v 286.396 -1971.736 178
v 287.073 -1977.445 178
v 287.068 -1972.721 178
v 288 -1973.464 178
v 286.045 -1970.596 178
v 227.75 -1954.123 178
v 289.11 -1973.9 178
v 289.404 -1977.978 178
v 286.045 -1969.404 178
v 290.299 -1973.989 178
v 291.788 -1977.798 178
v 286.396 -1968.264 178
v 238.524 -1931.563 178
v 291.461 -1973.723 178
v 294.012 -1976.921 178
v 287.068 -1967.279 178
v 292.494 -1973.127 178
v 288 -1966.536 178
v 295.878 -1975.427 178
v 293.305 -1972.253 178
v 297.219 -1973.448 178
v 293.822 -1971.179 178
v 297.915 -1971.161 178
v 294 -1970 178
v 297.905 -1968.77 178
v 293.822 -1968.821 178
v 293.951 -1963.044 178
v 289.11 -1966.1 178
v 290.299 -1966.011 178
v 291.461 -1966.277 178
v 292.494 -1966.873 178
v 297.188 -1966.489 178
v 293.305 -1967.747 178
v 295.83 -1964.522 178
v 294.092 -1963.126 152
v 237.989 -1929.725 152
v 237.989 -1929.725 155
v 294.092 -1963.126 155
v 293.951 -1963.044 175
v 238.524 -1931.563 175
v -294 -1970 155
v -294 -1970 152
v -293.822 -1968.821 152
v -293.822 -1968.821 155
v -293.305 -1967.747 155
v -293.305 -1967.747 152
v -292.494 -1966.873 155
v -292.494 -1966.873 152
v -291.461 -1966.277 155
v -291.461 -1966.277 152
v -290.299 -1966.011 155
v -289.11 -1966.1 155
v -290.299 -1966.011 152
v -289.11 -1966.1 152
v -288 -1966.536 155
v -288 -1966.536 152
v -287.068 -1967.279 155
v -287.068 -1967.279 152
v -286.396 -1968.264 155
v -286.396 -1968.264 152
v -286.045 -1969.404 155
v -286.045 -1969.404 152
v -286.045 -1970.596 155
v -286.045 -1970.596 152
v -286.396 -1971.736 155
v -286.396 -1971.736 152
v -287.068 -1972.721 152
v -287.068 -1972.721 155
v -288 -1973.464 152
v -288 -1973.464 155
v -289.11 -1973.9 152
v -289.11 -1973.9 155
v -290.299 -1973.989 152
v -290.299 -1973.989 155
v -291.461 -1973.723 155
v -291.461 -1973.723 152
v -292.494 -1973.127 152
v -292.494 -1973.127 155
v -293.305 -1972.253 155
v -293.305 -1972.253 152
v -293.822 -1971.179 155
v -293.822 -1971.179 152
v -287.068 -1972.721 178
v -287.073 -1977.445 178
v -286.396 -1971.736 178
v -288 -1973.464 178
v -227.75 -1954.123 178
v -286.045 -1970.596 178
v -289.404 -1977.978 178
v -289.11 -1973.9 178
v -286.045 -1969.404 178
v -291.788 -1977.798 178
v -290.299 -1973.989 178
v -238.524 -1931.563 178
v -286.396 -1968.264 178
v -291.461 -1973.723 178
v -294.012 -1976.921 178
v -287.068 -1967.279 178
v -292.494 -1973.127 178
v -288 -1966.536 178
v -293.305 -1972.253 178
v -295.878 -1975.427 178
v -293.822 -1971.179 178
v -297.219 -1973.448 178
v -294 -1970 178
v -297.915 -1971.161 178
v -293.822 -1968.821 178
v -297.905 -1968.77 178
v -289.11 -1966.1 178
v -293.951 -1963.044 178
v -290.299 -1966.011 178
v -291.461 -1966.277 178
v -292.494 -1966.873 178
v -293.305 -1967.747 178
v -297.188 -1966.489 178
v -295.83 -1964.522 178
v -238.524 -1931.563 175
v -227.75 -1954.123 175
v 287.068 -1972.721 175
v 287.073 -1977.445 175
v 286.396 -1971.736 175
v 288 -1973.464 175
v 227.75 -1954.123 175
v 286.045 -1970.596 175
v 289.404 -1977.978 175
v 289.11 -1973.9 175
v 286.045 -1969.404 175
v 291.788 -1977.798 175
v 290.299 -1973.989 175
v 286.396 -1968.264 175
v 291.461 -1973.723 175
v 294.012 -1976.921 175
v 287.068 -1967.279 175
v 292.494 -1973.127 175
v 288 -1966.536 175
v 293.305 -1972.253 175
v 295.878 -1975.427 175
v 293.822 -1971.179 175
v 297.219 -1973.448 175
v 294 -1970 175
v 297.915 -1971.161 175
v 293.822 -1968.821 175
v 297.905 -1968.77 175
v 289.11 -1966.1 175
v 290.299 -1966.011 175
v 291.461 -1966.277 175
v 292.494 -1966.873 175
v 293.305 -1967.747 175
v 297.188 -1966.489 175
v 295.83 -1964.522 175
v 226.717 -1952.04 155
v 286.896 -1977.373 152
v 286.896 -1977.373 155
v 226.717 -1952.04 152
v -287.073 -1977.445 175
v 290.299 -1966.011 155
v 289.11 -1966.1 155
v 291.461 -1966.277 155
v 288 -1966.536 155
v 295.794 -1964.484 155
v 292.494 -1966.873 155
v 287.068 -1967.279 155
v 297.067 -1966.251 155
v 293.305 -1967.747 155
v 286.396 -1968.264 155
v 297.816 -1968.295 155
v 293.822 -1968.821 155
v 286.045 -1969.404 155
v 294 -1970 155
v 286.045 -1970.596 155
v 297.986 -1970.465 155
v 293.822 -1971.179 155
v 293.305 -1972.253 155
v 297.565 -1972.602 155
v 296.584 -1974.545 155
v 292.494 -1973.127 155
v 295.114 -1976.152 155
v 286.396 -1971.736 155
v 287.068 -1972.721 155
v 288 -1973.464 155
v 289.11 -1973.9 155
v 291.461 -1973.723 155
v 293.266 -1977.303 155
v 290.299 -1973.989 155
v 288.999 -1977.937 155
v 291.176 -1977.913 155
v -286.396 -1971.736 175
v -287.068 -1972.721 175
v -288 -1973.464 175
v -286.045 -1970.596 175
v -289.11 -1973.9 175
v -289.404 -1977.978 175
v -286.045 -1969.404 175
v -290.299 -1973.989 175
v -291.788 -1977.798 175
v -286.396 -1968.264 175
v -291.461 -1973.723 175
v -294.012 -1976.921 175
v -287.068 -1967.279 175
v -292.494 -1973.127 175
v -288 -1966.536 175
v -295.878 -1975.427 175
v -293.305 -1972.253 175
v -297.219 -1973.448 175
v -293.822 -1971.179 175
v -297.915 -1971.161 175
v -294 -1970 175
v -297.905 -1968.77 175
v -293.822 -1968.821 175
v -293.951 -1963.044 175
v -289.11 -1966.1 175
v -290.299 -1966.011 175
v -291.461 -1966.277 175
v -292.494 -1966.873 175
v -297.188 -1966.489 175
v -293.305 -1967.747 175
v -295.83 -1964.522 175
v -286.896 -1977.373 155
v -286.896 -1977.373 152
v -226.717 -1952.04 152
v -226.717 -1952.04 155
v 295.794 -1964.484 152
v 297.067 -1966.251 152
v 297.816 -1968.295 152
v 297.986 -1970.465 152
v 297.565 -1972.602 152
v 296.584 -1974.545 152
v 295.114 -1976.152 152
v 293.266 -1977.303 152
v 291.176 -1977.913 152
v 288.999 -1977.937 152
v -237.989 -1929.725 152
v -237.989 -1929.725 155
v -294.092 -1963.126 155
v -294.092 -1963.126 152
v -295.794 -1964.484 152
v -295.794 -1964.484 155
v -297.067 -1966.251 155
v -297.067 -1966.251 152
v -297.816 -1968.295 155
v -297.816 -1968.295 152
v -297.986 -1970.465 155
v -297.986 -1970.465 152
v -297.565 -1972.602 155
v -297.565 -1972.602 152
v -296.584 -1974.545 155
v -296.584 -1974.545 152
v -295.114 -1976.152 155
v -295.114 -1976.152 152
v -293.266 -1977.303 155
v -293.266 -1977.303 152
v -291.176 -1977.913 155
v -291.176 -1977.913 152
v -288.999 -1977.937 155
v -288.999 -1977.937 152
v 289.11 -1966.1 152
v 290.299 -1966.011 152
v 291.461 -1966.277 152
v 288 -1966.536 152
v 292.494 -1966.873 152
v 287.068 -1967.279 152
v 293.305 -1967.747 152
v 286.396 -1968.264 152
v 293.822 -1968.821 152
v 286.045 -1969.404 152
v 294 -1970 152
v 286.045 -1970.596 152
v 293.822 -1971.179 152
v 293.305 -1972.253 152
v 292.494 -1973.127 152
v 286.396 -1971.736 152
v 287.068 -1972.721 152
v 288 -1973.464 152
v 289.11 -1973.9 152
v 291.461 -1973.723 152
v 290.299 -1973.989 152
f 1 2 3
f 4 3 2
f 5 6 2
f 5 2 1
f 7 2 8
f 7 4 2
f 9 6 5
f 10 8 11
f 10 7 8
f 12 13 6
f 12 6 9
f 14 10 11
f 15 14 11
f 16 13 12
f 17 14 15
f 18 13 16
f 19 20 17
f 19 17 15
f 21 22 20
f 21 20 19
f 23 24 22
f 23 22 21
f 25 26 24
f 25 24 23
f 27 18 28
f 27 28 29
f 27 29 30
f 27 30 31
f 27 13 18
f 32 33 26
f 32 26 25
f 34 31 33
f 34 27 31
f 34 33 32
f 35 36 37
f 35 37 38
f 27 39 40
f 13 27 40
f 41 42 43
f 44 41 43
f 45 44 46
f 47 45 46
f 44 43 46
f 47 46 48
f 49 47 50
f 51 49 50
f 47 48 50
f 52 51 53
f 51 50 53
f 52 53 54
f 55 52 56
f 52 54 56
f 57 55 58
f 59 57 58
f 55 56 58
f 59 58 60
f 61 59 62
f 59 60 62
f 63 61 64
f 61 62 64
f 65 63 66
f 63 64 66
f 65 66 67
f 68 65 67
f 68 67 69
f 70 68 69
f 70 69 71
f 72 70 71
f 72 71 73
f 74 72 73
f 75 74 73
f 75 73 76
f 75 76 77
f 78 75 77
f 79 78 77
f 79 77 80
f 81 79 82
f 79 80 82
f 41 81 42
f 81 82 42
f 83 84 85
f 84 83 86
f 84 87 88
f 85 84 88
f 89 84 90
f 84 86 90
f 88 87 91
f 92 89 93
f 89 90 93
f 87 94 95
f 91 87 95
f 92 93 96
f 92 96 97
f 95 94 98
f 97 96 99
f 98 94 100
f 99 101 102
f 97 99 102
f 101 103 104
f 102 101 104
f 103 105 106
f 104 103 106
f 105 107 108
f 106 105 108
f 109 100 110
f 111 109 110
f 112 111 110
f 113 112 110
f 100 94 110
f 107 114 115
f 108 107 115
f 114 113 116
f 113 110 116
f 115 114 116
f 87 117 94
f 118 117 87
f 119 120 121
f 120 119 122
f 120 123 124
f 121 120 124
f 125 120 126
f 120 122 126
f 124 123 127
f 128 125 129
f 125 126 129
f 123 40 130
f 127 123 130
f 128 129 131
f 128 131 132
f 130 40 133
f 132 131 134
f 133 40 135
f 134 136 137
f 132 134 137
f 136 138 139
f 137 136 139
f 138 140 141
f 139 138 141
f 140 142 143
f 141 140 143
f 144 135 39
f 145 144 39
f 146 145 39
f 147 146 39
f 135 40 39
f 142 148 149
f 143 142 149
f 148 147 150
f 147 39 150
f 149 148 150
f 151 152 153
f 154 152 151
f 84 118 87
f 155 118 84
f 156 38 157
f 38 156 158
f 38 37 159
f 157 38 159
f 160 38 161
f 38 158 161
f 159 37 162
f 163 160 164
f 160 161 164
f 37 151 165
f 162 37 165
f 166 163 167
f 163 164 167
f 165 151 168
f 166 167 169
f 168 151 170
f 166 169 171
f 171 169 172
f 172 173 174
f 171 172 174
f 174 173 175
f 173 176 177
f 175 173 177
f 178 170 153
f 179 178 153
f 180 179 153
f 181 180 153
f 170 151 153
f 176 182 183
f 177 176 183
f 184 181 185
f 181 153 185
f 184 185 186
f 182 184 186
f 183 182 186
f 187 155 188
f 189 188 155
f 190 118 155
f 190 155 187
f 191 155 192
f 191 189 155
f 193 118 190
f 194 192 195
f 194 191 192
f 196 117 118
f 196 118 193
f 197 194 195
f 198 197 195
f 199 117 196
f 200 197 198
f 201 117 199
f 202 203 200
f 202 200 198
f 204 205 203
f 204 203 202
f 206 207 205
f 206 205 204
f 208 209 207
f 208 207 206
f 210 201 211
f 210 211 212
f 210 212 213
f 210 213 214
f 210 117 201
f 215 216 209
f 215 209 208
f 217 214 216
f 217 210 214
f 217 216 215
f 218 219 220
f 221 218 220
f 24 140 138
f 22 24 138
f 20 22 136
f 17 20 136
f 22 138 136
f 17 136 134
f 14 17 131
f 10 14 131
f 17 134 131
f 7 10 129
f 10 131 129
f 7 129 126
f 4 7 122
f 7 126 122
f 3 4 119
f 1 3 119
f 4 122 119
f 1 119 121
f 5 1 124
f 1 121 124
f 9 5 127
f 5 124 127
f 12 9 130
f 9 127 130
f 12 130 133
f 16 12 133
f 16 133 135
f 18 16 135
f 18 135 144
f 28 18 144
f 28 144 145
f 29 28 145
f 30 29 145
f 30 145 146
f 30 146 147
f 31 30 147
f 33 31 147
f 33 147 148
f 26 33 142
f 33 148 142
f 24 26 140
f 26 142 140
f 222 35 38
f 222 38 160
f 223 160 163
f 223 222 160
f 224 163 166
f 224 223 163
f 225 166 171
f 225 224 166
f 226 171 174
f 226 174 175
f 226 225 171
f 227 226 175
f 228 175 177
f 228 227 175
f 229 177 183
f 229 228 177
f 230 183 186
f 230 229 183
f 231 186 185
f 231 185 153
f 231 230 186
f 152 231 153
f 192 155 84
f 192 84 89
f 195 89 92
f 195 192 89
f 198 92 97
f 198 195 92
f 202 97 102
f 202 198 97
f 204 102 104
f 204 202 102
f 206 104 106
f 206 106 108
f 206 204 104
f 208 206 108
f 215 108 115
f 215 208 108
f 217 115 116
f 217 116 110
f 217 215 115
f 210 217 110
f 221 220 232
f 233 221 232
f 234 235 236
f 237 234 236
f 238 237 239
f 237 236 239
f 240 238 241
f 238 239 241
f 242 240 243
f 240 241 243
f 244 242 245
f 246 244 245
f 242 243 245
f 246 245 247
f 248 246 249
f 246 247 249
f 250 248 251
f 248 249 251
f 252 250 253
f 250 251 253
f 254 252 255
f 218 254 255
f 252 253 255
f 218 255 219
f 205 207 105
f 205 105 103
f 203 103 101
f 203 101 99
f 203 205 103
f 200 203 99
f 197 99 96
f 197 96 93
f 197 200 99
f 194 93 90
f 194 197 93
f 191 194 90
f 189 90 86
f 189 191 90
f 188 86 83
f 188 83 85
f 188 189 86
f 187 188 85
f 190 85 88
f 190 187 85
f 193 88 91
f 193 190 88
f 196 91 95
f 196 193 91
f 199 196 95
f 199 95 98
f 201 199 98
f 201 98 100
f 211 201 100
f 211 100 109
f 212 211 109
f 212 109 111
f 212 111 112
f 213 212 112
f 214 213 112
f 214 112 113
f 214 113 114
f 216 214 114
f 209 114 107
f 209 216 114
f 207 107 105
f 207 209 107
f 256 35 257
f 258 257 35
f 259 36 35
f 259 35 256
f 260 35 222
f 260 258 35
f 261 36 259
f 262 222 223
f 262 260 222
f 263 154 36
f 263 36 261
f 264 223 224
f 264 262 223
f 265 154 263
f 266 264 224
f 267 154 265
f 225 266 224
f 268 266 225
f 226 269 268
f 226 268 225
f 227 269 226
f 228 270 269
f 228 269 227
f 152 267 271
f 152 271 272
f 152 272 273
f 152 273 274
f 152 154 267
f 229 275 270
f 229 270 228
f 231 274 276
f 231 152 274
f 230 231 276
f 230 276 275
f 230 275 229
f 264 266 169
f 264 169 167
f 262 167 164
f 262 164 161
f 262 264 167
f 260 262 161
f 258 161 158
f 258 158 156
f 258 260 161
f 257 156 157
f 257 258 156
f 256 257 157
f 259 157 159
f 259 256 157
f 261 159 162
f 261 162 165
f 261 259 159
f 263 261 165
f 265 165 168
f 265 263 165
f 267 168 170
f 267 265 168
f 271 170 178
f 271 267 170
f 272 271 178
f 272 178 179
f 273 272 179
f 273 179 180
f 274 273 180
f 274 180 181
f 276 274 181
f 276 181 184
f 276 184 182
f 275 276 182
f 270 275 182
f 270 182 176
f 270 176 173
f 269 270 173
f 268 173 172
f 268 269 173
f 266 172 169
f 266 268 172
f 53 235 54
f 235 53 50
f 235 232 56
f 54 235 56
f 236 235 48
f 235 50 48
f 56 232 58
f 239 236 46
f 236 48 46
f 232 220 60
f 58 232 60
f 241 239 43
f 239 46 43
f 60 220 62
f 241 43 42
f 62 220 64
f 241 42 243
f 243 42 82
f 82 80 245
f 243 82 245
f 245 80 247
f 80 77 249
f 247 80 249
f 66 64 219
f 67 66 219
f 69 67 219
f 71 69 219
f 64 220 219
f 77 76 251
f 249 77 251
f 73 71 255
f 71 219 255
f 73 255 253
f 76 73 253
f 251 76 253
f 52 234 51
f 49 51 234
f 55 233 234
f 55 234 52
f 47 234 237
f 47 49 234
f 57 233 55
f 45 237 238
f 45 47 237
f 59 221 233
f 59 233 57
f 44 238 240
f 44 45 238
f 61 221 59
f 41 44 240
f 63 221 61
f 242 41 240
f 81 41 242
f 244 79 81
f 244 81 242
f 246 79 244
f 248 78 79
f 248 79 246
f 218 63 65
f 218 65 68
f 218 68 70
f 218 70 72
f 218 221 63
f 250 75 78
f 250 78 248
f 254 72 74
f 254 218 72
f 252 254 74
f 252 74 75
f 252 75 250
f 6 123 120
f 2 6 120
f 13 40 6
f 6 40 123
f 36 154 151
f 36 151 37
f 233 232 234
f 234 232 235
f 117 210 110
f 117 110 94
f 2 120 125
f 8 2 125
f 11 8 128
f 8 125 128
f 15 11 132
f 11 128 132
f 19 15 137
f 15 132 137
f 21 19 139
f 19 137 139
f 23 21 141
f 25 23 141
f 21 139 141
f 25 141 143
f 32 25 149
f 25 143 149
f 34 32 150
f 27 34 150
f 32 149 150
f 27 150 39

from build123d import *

# Parameters (mm, degrees)
F_3DSKETCH1_R        = 4
BOSS_EXTRUDE_U_DEPTH = 3
BOSS_EXTRUDE_L_START = -3
F_3DSKETCH2_R        = 4
BOSS_EXTRUDE_L_DEPTH = 3


with BuildPart() as part:
    # 3DSketch1 → Boss-Extrude-U (new body)
    with BuildSketch(Plane(origin=(293.950914733, -1963.043688278, 175), x_dir=(-0.9910422724667208, 0.1335485461695409, -2.0318374546162863e-13), z_dir=(0, 0, -1))):
        with BuildLine():
            Line((0, 0), (59.134296826, 23.796048266))
            Line((59.134296826, 23.796048266), (66.799026887, 0))
            Line((66.799026887, 0), (4.893078056, -15.191131412))
            ThreePointArc((4.893078056, -15.191131412), (-4.628217248, -9.874351515), (0, 0))
        make_face()
        with Locations(Location((2.986518198, -7.421637896, 0), (0, 0, 172.32530228))):
            Circle(F_3DSKETCH1_R, mode=Mode.SUBTRACT)
    extrude(amount=-BOSS_EXTRUDE_U_DEPTH)


with BuildPart() as body_2:
    # 3DSketch2 → Boss-Extrude-L (new body)
    with BuildSketch(Plane(origin=(286.896060673, -1977.373300526, 155), x_dir=(-0.7162661408080038, 0.6978272103694504, 1.6259589829986966e-15), z_dir=(0, 0, 1)).offset(BOSS_EXTRUDE_L_START)):
        with BuildLine():
            Line((0, 0), (60.782410485, 23.848885443))
            Line((60.782410485, 23.848885443), (68.281121248, 0))
            Line((68.281121248, 0), (4.787665959, -15.226683706))
            ThreePointArc((4.787665959, -15.226683706), (-4.709600247, -9.846846279), (0, 0))
        make_face()
        with Locations(Location((2.922043094, -7.447258835, 0), (0, 0, 224.252939686))):
            Circle(F_3DSKETCH2_R, mode=Mode.SUBTRACT)
    extrude(amount=BOSS_EXTRUDE_L_DEPTH)


with BuildPart() as body_3:
    # Mirror1: mirrored copy
    add(part.part.mirror(Plane(origin=(0, 0, 0), x_dir=(0, 0, 1), z_dir=(1, 0, 0))))


with BuildPart() as body_4:
    # Mirror1 2: mirrored copy
    add(body_2.part.mirror(Plane(origin=(0, 0, 0), x_dir=(0, 0, 1), z_dir=(1, 0, 0))))


solid = Compound([part.part, body_2.part, body_3.part, body_4.part])
